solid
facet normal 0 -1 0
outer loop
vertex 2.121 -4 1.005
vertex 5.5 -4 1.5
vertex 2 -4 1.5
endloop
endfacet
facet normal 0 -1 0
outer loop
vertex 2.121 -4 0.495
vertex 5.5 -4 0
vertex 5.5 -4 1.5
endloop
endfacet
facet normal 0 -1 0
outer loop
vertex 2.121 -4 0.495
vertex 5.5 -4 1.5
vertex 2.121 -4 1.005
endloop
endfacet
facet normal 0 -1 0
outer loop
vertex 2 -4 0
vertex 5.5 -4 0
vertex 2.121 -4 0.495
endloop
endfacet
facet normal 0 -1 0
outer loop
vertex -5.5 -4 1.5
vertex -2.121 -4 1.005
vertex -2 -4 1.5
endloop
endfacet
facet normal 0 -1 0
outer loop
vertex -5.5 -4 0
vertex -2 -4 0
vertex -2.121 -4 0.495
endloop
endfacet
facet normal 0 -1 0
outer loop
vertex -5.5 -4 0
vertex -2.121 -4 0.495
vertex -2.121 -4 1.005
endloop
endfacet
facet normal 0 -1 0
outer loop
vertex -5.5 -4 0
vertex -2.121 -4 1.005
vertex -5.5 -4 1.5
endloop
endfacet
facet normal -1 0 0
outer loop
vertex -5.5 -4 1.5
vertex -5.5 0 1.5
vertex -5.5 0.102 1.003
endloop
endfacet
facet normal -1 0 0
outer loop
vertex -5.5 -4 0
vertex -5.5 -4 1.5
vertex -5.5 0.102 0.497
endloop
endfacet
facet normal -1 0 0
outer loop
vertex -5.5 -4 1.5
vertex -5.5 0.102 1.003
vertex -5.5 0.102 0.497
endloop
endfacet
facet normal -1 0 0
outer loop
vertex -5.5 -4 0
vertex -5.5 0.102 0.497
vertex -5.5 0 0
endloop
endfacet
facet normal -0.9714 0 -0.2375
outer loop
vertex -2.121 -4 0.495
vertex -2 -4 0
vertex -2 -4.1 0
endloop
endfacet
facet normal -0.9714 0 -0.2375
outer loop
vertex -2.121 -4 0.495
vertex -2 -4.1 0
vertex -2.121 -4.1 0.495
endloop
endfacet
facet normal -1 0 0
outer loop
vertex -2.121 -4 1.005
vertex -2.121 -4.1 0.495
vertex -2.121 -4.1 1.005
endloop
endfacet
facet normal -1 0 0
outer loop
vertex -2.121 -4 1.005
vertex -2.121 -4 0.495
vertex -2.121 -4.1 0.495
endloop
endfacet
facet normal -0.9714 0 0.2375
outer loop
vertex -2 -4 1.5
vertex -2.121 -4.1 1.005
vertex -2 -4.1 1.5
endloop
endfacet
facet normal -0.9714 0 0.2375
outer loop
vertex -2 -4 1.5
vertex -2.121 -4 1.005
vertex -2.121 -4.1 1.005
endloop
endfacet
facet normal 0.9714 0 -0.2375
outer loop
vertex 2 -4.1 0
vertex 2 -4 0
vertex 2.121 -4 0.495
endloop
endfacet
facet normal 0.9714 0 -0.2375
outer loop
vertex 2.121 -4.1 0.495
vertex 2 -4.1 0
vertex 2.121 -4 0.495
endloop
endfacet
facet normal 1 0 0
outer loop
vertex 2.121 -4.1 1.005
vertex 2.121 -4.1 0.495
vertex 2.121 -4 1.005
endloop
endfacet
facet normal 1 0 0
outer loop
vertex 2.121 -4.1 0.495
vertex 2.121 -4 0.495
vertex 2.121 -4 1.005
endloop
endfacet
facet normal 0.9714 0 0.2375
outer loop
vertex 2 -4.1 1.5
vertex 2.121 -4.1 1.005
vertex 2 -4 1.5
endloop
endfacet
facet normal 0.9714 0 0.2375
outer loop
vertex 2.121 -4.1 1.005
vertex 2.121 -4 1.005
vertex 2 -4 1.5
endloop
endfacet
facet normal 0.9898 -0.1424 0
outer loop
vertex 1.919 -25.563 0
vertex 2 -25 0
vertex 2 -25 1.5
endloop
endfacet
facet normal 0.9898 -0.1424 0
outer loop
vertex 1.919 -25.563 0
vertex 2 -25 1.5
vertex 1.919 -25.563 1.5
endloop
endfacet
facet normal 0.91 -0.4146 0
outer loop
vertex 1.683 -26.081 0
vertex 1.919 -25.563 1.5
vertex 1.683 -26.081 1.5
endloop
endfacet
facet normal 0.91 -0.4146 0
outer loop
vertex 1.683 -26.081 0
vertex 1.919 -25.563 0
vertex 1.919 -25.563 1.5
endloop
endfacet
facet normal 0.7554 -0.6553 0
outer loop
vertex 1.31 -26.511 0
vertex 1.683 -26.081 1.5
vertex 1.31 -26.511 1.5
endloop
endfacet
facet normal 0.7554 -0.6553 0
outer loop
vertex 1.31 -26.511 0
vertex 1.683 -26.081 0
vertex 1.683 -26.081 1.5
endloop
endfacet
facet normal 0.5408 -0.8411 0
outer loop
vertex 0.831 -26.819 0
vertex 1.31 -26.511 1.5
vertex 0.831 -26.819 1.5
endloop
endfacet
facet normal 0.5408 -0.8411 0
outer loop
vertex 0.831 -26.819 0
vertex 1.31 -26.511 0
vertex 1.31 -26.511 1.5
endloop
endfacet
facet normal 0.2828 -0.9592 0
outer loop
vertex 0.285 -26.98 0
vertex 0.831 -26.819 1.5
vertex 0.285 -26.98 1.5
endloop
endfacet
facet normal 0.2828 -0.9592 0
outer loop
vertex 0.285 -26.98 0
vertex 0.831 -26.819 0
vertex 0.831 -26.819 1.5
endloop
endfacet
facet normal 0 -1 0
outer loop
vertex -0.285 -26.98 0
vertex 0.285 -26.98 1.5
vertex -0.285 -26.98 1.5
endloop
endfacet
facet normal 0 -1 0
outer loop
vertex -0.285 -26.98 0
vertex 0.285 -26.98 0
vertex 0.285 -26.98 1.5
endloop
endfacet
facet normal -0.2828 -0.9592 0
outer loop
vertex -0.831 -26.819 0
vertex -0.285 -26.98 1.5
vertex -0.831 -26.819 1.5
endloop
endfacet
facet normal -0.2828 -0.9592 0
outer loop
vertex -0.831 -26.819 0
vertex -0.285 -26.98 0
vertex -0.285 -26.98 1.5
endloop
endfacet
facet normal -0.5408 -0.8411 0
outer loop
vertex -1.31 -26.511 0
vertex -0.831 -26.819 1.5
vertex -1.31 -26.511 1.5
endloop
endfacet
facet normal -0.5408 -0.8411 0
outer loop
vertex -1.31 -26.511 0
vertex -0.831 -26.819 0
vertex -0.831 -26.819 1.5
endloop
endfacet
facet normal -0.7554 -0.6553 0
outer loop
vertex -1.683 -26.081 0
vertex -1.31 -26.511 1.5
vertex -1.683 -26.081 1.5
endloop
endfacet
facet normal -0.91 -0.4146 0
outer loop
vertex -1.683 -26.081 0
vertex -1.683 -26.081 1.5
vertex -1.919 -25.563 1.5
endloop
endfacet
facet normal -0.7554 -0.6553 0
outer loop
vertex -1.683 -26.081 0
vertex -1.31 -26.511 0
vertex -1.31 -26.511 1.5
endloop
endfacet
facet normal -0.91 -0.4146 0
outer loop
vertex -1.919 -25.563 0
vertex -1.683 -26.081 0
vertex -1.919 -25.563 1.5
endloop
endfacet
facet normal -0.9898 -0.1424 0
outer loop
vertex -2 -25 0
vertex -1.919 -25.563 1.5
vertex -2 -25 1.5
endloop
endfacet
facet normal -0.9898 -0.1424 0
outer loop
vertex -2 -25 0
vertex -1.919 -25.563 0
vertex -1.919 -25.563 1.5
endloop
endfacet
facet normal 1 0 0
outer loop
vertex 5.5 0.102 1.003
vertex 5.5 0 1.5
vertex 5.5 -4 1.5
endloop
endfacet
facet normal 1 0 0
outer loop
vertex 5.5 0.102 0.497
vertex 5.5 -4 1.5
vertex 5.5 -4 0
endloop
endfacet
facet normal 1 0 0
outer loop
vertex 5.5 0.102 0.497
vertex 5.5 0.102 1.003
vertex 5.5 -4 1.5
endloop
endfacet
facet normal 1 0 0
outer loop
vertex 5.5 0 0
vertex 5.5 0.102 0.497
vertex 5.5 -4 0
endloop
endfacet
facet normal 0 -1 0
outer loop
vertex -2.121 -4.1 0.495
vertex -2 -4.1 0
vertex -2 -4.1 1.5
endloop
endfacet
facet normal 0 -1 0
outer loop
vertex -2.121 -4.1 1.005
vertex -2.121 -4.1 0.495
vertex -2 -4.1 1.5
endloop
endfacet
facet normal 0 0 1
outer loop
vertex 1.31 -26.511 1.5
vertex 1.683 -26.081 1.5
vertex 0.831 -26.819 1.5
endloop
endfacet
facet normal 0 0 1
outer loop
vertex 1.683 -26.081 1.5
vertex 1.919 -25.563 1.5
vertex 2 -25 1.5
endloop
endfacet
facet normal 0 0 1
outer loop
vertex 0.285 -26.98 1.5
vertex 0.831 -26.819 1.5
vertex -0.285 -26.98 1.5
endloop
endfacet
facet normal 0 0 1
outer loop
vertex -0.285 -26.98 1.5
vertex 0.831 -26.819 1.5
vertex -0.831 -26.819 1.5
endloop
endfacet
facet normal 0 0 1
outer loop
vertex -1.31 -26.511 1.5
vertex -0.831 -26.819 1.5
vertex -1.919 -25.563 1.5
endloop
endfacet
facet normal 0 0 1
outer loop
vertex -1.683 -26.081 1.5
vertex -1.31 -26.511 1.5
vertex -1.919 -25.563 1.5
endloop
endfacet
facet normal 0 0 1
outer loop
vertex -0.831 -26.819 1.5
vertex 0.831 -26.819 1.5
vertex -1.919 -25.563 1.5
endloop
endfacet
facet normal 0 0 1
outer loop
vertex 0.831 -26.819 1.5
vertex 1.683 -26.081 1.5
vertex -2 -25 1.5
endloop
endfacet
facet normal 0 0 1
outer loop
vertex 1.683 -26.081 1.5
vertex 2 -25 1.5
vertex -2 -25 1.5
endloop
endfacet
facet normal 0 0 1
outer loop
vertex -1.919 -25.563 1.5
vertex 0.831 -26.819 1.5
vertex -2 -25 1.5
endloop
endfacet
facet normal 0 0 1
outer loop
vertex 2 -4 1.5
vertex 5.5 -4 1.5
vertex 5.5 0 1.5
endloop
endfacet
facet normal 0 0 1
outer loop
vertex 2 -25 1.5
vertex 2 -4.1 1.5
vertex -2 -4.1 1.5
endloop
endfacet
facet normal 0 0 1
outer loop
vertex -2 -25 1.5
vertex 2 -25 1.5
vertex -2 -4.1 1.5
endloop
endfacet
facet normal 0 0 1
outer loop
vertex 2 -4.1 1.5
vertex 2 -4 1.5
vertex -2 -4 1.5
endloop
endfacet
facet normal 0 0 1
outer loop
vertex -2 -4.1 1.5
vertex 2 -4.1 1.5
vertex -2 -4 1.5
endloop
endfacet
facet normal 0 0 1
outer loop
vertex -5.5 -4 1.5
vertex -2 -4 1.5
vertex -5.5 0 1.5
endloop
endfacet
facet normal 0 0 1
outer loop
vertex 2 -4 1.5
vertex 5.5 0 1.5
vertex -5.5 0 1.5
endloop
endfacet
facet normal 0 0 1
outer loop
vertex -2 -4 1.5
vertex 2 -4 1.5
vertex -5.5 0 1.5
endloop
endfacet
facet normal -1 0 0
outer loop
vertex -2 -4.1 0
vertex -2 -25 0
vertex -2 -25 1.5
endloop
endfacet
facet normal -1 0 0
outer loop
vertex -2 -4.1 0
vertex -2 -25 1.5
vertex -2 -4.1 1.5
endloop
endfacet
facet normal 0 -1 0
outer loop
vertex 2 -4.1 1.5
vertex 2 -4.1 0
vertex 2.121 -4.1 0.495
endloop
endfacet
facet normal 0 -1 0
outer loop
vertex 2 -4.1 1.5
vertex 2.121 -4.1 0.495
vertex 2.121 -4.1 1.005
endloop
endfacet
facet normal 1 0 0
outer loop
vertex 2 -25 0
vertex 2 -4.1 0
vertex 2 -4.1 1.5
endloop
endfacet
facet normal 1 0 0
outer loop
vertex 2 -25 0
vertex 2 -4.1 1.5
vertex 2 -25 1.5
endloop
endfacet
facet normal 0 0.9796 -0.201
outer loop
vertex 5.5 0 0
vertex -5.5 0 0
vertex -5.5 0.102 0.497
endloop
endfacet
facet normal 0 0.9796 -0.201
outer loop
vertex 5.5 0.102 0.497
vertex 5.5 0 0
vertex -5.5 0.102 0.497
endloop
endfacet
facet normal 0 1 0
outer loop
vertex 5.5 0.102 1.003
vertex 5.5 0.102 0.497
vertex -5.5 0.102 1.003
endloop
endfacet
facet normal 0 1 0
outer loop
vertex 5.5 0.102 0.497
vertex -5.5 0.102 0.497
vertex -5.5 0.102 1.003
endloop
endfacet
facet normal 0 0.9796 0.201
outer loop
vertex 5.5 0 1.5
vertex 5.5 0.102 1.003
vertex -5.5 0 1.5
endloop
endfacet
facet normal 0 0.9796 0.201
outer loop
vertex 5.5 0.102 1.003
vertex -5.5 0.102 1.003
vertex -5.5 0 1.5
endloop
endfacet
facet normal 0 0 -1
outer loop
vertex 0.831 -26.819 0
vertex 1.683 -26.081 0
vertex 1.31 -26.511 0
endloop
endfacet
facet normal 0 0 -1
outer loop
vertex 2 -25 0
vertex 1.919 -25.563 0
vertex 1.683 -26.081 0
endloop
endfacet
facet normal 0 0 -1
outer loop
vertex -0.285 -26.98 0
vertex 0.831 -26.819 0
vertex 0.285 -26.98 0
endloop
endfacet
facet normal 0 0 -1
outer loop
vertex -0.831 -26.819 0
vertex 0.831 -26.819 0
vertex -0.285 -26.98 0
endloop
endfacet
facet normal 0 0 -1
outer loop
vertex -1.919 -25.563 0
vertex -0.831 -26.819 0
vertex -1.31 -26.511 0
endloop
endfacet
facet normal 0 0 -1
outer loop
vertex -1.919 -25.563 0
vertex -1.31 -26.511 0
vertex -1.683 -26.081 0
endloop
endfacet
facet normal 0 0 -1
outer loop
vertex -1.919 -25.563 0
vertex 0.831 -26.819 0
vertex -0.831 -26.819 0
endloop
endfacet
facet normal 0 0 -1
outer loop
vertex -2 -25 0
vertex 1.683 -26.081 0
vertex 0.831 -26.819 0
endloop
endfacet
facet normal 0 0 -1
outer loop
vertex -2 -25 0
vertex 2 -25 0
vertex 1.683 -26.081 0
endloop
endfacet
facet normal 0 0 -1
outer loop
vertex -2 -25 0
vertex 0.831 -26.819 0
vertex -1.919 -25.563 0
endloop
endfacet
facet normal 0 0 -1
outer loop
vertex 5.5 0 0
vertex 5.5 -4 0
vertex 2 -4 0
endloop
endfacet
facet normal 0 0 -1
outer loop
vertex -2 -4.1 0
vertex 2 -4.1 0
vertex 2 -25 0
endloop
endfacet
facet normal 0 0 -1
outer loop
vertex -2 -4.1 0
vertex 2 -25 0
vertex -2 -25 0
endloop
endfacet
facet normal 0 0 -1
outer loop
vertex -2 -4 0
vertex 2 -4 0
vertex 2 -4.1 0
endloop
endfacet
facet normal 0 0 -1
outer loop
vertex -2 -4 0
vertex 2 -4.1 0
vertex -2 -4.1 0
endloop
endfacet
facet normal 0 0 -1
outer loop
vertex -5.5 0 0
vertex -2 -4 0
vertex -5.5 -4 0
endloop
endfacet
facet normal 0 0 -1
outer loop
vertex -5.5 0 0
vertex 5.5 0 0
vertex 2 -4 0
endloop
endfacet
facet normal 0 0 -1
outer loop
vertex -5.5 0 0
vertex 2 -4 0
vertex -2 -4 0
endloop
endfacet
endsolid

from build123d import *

# Parameters (mm, degrees)
EXTRUSION1_DEPTH = 1.5
EXTRUSION2_DEPTH = 0.1
EXTRUSION3_DEPTH = 11


with BuildPart() as part:
    # Esquisse1 → Extrusion1 (new body)
    with BuildSketch(Plane.XY):
        with BuildLine():
            Line((-5.5, 0), (5.5, 0))
            Line((5.5, 0), (5.5, -4))
            Line((5.5, -4), (2, -4))
            Line((2, -4), (2, -25))
            ThreePointArc((2, -25), (0, -27), (-2, -25))
            Line((-2, -25), (-2, -4))
            Line((-2, -4), (-5.5, -4))
            Line((-5.5, -4), (-5.5, 0))
        make_face()
    extrude(amount=EXTRUSION1_DEPTH)

    # Esquisse2 → Extrusion2 (add)
    with BuildSketch(Plane.XZ.offset(4)):
        with BuildLine():
            Line((-2, 1.5), (-2, 0))
            ThreePointArc((-2, 0), (-2.136000936, 0.75), (-2, 1.5))
        make_face()
        with BuildLine():
            Line((2, 1.5), (2, 0))
            ThreePointArc((2, 0), (2.136000936, 0.75), (2, 1.5))
        make_face()
    extrude(amount=EXTRUSION2_DEPTH)

    # Esquisse3 → Extrusion3 (add)
    with BuildSketch(Plane.ZY.offset(5.5)):
        with BuildLine():
            Line((1.5, 0), (0, 0))
            ThreePointArc((0, 0), (0.75, 0.115151996), (1.5, 0))
        make_face()
    extrude(amount=-EXTRUSION3_DEPTH)


solid = part.part
